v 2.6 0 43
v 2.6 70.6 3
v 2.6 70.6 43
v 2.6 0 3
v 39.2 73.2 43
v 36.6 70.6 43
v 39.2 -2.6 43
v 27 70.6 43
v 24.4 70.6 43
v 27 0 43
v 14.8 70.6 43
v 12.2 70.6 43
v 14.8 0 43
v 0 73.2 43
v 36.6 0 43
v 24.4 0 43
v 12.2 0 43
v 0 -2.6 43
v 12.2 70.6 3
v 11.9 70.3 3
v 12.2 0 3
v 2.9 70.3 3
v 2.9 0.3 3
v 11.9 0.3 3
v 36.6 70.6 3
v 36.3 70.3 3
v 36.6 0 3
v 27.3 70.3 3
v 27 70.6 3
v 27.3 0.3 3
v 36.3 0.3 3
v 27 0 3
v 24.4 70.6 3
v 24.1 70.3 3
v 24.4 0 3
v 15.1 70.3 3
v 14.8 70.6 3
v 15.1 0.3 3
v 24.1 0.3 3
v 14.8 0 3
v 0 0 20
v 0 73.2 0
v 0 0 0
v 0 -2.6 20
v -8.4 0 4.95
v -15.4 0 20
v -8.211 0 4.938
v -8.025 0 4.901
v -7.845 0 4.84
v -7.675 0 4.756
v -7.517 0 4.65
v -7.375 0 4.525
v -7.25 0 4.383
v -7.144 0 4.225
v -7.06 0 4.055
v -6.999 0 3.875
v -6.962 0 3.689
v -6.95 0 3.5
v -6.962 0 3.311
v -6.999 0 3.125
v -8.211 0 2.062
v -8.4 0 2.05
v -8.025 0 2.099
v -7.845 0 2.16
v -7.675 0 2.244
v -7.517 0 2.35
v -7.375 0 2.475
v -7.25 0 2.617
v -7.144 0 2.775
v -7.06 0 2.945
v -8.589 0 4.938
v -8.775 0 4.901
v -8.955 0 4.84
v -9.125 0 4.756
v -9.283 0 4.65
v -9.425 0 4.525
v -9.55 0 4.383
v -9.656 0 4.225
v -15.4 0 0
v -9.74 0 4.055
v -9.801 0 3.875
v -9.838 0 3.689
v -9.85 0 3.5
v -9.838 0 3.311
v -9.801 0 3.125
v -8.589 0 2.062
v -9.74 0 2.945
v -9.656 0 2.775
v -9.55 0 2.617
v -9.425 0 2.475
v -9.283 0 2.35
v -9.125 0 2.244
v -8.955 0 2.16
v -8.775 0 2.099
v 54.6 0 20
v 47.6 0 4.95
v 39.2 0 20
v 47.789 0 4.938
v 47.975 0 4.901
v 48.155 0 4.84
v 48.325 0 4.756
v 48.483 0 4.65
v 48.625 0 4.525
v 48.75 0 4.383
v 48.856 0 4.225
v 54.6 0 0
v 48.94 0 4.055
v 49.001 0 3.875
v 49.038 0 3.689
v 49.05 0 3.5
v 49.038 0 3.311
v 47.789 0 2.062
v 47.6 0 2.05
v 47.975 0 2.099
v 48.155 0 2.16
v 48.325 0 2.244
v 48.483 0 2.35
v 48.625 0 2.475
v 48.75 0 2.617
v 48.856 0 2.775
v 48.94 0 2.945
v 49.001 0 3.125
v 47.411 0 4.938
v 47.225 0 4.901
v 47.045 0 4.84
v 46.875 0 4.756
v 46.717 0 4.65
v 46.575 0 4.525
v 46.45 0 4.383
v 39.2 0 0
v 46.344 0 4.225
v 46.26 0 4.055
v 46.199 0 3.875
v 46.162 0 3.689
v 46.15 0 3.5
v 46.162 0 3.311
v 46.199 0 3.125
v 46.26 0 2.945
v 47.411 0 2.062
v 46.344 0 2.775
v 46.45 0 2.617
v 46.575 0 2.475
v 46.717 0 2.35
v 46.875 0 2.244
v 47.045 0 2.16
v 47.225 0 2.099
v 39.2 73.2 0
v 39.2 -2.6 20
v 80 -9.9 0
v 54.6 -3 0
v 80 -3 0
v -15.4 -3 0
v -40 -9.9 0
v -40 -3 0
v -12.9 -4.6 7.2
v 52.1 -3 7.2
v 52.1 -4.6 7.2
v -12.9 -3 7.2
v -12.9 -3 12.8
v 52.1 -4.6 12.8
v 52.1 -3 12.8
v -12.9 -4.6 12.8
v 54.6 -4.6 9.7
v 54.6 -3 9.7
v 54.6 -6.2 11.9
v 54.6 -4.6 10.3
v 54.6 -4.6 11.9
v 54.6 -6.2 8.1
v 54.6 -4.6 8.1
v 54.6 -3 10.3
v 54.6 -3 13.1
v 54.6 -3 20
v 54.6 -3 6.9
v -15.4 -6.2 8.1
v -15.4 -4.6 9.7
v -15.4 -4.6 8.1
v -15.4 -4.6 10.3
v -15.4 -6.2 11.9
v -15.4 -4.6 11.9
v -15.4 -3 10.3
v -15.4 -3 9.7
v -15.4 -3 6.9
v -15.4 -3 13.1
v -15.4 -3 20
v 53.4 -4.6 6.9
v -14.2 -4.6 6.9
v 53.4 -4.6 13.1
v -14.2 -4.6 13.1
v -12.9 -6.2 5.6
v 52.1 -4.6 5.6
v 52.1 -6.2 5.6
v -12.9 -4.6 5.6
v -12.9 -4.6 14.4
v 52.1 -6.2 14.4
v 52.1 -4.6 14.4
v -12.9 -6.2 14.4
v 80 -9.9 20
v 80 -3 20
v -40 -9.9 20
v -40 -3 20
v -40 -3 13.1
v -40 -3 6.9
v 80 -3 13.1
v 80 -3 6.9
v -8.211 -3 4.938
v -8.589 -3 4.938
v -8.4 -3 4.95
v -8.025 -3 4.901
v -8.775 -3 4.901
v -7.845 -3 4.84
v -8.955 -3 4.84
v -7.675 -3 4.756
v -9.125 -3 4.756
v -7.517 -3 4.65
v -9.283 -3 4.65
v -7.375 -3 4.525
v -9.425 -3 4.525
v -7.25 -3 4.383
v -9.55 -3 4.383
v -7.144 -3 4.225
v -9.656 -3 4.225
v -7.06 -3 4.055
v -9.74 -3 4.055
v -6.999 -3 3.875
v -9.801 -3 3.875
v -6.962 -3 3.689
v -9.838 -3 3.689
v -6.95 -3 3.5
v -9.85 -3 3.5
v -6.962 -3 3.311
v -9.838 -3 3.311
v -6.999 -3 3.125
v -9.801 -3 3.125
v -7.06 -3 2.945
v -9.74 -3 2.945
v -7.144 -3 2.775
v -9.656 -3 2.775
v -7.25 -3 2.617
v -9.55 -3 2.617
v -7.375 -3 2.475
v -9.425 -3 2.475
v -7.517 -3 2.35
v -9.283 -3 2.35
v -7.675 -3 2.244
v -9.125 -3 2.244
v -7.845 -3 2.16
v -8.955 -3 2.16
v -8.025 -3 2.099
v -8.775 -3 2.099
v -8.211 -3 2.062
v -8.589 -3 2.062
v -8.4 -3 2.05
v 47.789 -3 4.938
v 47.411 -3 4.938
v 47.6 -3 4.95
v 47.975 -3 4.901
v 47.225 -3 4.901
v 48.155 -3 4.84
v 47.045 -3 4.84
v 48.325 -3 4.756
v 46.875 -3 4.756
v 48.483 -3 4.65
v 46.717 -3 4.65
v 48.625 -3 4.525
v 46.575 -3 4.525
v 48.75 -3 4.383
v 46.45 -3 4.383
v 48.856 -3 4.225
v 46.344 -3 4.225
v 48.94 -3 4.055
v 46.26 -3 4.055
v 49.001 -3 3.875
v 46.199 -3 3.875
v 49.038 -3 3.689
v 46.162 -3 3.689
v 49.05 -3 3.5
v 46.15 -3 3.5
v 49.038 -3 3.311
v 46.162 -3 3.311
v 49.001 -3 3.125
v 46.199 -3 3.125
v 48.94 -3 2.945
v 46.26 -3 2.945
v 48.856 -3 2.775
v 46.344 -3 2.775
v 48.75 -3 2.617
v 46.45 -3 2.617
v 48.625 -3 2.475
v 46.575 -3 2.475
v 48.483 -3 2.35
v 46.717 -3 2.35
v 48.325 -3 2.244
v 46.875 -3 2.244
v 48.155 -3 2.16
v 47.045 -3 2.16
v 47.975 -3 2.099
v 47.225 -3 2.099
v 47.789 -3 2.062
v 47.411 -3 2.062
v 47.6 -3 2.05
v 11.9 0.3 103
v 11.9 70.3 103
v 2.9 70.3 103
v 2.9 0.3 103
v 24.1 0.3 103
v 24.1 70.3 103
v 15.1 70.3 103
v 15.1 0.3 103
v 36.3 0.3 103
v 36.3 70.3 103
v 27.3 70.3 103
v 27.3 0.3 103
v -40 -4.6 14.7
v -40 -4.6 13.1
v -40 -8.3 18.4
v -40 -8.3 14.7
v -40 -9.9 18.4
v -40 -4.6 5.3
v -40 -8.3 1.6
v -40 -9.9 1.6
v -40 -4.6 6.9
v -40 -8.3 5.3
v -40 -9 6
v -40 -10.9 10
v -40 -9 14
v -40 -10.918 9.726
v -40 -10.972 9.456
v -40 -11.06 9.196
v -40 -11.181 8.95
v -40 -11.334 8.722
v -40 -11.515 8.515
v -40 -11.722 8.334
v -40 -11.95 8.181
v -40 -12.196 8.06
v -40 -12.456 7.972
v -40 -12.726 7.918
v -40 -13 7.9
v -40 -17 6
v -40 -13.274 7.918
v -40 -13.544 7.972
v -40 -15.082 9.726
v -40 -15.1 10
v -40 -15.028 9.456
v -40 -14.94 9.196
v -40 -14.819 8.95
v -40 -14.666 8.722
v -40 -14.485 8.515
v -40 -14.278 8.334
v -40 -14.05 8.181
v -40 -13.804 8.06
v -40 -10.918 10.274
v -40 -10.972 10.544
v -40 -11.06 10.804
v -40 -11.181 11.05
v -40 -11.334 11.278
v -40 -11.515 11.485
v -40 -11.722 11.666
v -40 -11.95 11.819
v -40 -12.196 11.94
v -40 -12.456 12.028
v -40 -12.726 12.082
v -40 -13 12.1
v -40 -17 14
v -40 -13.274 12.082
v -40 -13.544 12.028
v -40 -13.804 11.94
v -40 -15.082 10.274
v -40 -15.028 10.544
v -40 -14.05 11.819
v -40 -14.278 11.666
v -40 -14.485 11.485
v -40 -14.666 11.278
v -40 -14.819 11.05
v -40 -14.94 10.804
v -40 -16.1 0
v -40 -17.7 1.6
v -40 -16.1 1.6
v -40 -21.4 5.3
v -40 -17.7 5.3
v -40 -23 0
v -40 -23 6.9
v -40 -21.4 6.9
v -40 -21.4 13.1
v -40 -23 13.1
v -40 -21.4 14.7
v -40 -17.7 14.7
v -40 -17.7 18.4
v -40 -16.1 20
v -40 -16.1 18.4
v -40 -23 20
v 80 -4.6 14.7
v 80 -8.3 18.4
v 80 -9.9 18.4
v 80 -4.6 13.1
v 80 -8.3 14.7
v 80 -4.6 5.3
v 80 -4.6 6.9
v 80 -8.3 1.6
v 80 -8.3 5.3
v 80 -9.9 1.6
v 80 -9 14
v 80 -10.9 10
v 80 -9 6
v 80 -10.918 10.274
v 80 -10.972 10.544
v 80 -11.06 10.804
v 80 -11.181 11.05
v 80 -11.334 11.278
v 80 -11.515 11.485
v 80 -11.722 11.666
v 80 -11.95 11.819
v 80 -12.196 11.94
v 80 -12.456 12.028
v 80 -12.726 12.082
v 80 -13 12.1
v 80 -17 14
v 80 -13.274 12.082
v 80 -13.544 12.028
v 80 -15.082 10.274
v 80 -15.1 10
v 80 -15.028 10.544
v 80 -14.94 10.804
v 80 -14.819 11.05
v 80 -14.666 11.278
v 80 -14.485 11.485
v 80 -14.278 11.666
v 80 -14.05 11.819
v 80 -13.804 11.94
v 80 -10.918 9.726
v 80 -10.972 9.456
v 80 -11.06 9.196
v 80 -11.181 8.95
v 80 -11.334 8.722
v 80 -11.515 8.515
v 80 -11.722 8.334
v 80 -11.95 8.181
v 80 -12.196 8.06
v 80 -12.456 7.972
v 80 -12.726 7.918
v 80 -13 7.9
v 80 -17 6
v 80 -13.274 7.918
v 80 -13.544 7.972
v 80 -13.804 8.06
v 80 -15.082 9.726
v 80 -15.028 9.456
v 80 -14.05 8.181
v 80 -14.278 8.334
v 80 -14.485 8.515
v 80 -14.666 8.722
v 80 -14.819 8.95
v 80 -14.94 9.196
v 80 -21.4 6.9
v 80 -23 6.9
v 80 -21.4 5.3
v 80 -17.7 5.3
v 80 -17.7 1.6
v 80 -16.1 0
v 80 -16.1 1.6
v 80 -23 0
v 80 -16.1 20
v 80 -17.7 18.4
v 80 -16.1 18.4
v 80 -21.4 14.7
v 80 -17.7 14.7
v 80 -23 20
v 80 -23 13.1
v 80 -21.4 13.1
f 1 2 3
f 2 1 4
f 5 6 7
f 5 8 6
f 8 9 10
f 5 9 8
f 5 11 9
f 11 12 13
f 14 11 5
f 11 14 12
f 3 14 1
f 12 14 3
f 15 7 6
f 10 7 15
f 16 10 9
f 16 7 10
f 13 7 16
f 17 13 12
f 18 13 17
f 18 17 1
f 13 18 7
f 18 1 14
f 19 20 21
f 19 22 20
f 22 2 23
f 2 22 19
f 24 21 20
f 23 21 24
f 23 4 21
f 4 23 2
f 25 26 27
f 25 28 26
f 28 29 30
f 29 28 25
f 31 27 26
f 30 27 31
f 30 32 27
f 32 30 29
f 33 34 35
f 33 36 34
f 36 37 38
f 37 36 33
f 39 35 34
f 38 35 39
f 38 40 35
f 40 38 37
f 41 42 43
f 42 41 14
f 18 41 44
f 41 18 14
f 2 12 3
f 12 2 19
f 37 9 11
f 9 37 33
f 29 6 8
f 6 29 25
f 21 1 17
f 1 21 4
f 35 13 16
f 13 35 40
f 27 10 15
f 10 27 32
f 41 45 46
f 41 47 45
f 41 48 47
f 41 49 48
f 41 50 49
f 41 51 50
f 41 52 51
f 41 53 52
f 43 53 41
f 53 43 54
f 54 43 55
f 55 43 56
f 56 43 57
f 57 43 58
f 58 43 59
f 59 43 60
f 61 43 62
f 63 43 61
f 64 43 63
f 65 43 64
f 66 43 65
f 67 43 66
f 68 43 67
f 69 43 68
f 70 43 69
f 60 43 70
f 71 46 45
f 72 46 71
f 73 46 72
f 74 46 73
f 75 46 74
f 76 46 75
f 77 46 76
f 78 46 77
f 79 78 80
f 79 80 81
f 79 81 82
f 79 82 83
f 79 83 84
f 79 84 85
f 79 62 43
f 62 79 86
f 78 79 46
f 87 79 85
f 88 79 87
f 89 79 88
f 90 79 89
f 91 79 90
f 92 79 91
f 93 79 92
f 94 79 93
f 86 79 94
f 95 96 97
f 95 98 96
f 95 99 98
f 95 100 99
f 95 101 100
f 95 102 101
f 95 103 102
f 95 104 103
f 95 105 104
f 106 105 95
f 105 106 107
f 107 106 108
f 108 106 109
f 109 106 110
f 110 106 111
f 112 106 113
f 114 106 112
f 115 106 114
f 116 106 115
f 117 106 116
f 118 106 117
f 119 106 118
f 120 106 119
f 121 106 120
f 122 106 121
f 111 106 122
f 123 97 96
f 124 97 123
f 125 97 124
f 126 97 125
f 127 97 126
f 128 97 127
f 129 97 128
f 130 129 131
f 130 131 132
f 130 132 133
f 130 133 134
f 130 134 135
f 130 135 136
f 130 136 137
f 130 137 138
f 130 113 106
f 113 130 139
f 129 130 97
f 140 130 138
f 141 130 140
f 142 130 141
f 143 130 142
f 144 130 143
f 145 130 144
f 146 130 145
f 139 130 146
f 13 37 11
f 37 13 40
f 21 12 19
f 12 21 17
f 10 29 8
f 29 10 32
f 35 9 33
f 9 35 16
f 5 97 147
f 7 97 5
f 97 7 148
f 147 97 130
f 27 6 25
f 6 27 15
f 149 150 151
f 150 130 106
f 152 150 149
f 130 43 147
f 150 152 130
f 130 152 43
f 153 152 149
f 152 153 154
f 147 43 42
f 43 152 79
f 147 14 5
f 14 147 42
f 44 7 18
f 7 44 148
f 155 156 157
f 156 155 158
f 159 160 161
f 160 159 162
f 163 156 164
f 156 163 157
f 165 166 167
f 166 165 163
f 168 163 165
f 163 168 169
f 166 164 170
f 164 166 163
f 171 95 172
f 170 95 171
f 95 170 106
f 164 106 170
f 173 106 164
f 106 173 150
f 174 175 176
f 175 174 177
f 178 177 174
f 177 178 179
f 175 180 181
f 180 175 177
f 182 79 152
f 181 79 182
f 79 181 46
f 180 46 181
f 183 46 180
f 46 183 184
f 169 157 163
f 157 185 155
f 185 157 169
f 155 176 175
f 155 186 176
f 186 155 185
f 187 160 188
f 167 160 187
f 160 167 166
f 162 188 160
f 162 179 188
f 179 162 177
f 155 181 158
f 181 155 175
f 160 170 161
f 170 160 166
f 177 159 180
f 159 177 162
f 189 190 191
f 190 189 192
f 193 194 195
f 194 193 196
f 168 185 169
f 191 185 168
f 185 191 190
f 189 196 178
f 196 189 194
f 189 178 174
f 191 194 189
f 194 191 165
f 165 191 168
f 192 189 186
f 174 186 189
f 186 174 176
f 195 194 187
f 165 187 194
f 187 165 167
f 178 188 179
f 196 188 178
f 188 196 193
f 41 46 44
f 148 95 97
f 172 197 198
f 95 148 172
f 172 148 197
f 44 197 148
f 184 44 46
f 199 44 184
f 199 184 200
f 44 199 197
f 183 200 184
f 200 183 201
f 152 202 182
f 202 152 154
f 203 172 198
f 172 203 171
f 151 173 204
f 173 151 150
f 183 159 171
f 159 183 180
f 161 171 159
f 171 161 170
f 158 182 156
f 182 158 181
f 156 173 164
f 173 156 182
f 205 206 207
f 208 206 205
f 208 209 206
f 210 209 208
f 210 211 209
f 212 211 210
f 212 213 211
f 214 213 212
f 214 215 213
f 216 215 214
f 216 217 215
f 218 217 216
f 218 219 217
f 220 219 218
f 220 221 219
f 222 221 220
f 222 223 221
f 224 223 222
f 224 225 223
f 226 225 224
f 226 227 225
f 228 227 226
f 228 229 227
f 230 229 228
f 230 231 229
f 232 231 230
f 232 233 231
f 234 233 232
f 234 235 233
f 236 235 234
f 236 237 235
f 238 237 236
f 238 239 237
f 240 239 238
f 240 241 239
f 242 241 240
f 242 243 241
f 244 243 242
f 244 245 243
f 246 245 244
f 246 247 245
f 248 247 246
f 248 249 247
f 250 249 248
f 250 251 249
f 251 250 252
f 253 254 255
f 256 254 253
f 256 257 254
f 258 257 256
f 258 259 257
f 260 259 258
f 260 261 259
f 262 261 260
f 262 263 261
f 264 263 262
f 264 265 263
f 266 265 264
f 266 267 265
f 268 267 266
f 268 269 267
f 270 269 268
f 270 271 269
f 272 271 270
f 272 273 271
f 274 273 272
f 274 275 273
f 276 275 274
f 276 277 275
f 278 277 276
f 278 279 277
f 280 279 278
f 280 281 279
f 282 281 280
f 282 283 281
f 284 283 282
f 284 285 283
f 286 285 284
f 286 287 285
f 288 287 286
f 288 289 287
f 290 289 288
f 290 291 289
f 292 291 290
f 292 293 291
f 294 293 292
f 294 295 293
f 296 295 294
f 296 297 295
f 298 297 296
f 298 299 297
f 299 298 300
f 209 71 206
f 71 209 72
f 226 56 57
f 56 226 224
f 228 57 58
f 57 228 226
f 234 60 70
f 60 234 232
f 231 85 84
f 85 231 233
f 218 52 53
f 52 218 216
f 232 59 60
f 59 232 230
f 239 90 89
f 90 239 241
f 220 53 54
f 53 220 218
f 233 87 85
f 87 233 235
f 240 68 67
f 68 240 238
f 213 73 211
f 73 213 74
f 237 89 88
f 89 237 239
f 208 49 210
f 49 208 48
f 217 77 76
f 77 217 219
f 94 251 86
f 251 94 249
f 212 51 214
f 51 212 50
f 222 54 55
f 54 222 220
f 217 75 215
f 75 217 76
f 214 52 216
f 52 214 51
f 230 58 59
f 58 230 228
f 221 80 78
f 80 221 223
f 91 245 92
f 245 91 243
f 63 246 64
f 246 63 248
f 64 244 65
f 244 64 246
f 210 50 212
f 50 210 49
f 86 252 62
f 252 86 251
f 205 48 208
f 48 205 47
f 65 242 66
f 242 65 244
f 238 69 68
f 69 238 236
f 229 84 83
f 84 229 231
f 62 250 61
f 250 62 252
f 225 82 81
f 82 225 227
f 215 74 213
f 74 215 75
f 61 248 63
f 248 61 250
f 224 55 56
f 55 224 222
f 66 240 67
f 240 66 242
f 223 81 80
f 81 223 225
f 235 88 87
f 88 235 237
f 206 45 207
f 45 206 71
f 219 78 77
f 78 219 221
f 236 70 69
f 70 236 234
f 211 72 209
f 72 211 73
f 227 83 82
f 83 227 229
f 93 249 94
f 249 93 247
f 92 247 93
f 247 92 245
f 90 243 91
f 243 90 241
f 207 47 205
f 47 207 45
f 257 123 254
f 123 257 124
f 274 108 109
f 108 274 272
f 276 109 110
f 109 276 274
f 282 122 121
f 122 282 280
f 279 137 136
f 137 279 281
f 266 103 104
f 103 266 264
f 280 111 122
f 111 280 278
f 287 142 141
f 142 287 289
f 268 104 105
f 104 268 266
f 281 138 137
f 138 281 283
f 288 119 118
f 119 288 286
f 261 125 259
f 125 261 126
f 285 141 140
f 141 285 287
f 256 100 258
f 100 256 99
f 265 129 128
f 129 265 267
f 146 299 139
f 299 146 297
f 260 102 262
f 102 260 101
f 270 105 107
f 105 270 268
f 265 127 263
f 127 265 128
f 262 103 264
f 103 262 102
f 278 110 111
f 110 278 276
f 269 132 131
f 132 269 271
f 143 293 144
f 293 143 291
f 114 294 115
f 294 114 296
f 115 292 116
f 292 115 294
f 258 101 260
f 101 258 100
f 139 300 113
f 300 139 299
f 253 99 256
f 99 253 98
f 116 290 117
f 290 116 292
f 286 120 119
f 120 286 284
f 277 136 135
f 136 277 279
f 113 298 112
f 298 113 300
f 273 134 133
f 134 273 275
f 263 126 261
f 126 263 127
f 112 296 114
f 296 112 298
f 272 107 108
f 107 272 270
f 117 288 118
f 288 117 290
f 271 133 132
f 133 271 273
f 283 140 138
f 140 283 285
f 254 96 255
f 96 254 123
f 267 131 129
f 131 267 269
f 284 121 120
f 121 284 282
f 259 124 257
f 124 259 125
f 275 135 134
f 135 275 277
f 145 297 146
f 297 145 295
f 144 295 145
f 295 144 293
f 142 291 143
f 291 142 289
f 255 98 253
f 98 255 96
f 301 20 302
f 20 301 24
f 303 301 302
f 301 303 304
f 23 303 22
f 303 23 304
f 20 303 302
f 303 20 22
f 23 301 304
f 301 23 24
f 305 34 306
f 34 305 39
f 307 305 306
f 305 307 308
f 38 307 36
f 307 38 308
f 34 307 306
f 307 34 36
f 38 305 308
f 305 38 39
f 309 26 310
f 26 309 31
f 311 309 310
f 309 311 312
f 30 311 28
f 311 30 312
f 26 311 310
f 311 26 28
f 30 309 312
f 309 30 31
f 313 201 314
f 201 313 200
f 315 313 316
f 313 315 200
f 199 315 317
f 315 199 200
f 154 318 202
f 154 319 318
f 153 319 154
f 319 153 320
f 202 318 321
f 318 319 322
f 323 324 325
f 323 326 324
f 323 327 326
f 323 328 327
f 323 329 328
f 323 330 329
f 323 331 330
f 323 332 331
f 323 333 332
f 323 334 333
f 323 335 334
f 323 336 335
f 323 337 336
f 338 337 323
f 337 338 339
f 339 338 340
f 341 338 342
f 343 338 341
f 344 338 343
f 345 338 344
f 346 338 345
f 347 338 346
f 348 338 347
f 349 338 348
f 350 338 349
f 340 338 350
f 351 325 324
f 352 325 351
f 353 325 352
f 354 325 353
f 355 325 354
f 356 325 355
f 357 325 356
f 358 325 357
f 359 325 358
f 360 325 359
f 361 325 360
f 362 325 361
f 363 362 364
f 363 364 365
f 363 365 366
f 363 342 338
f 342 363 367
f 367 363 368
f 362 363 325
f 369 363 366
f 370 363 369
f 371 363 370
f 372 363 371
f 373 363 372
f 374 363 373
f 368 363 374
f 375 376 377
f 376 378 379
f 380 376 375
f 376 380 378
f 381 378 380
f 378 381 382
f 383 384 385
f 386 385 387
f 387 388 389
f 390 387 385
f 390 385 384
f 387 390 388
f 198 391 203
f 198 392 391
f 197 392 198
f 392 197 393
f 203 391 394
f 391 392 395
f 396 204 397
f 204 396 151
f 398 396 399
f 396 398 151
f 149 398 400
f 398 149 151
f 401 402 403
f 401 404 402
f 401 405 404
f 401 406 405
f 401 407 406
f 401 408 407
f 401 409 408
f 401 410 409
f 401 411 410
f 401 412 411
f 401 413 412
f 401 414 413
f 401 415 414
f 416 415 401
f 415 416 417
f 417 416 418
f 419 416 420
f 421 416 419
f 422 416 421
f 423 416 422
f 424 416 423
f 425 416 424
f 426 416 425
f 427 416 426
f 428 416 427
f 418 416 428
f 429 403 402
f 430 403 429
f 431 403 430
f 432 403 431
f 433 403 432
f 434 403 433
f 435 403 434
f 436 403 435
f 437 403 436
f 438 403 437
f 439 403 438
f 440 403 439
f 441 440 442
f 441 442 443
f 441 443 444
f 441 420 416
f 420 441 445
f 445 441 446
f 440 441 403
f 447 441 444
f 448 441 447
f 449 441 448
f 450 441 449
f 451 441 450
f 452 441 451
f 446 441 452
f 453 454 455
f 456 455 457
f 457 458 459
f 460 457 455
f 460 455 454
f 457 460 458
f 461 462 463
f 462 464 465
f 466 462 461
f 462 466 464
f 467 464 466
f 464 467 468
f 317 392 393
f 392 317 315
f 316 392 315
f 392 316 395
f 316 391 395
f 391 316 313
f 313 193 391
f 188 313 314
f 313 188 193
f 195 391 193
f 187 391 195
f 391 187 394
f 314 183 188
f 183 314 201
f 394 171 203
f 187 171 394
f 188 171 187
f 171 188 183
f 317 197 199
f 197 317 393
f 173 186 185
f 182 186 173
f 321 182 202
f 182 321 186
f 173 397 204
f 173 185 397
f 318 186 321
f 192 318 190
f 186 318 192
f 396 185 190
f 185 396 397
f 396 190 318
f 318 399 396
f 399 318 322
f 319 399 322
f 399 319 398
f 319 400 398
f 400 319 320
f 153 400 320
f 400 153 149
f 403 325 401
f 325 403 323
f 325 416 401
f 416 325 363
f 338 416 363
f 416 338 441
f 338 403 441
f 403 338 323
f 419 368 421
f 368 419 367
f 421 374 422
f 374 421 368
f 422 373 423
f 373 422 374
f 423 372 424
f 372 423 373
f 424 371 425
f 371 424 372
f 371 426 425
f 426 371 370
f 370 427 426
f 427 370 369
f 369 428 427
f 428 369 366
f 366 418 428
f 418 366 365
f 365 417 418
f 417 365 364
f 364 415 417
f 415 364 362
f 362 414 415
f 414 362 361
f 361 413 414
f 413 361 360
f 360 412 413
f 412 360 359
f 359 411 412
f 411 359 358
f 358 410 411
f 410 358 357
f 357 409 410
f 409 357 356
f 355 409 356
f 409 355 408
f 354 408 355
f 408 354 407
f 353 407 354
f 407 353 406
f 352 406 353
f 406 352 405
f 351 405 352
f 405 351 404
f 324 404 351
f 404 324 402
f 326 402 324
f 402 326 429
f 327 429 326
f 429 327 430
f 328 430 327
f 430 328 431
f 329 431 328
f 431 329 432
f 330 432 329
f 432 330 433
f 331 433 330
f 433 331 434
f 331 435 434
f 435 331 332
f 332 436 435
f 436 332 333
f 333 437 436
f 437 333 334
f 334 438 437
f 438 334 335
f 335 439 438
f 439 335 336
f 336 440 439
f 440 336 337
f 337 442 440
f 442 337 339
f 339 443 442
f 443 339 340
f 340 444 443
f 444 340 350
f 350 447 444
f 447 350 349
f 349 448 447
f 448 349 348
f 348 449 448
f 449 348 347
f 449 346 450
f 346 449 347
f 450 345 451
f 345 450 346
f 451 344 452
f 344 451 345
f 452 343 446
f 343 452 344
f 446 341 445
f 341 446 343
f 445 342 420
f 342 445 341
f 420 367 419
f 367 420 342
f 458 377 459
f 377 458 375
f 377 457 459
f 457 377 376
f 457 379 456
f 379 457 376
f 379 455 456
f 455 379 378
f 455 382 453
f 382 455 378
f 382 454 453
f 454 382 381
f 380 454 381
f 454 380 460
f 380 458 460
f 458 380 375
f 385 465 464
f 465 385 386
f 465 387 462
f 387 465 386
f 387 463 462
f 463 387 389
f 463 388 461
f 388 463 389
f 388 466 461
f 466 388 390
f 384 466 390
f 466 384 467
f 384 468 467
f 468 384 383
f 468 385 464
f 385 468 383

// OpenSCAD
// file: ssd_holder.scad
// ============================================================
// 3-Bay Vertical 2.5" SSD Holder w/ T-Slot Rail Mount
// ============================================================
// Holds three 2.5" drives (70 x 100 x 9 mm) upright, SIDE BY SIDE
// ALONG THE RAIL — all three sit the same distance out from the
// rail rather than receding front-to-back, so no drive hangs off
// the end of a long lever arm. Each bay is a fully enclosed tub
// (floor + left/right dividers + front/back walls) with ONLY the
// top open, so the connector end of each drive stays reachable
// for cables while the drive itself is boxed in on every side.
//
// Mounting: ONE flat plate carrying ONE T-shaped key, running the
// full plate_len (default 70mm) along the rail. The key slides
// into the rail's channel from the end of the extrusion and is
// trapped by that channel's back wall and both side lips; the
// plate bears flat against the rail face. Tapered lead-ins at
// both ends of the key let it start from either direction and
// back straight off the way it went on.
//
// Note on "the longer side": with the drives side by side the
// comb's mounting face is its 39.2mm one — the 70mm faces are the
// ends of the stack, and mounting there is what puts the drives
// back in a front-to-back line. So the plate is instead EXTENDED
// to 70mm along the rail, overhanging the comb ~15mm at each end.
// That's the longest rail engagement available without going back
// to front-to-back drives. Set plate_len = comb_width for a flush
// plate if the overhang is in the way.
//
// Optional M3 set screws (set_screw = true) run through the
// plate's two overhanging ends, where nothing is behind them so a
// driver reaches with the drives still in. Driving them against
// the rail face pushes the bracket out and pulls the key's head
// up against the slot lips, taking the play out of the slide fit.
// Without them the bracket still holds but can rock slightly on
// its clearances.
//
// The rail is assumed HORIZONTAL, drives standing vertically
// (open top up) perpendicular to it. The rail's bottom sits flush
// with the bottom of the holder.
//
// Default key dims (6.2mm mouth / 9.4mm channel) match common
// 20-series T-slot/V-slot extrusion; measure your actual rail and
// adjust slot_mouth/channel_w/lip_thickness/head_depth below if
// it differs — a wrong fit either won't slide in or will be loose.
//
// Print settings: 3-4 walls, 20%+ infill, NO SUPPORTS — the comb
// floor and the mounting plate both sit flat on the bed, and the
// key's 3.2mm horizontal protrusion is short enough to print
// clean. PETG or ABS recommended since drives run warm; PLA is
// fine for a desk build.
// ============================================================

$fn = 48;

// ---- Drive dimensions ----
drive_w = 70;             // drive width (mm) - horizontal, pointing away from the rail
drive_h = 100;             // drive height (mm) - reference only, top is open
drive_t = 9;               // drive thickness (mm) - stacking direction, along the rail
drive_t_clearance = 0.6;   // total slack added to slot thickness for easy insertion
drive_y_clearance = 0.6;   // total slack added along the drive's width

// ---- Holder geometry ----
n_bays      = 3;
wall_t      = 2.6;   // divider / front-wall / back-wall thickness
wall_height = 40;    // how far up the walls enclose the drive (rest is open, at top)
floor_t     = 3;     // base plate thickness
slot_gap    = drive_t + drive_t_clearance;
bay_depth   = drive_w + drive_y_clearance; // how far each bay reaches away from the rail

// ---- Rail mount: one flat plate, one key ----
rail_size     = 20;    // T-slot extrusion cross-section (square)
plate_t       = 3;     // mounting plate thickness
plate_len     = 70;    // how far the plate runs ALONG the rail (engagement length)
plate_h       = 20;    // plate height - matches the rail face it bears against
slot_mouth    = 6.2;   // width of the narrow opening on the rail face
channel_w     = 9.4;   // internal width of the T-slot channel
lip_thickness = 1.6;   // depth of the narrow mouth before it opens into the channel
head_depth    = 1.6;   // how far the wide part of the key sits inside the channel
key_clearance = 0.3;   // per-side clearance so the key slides freely
key_lead_in   = 2.5;   // taper at each end of the key, so it starts into the slot
set_screw     = true;  // M3 set-screw holes through the plate to take up slide play
set_screw_d   = 2.9;   // pilot diameter for an M3 screw self-tapping into plastic
set_screw_inset = 7;   // how far each screw sits in from the plate's ends
set_screw_z   = 3.5;   // screw height on the plate - below the key, on solid rail face

key_neck_w = slot_mouth - 2 * key_clearance;
key_head_w = channel_w - 2 * key_clearance;

// ---- Derived ----
comb_width   = (n_bays + 1) * wall_t + n_bays * slot_gap; // span along the rail
total_height = floor_t + wall_height;
plate_x0     = (comb_width - plate_len) / 2;  // plate centered on the comb
key_z        = rail_size / 2;                 // key on the rail's slot centerline

module divider(x) {
    translate([x, 0, floor_t])
        cube([wall_t, bay_depth, wall_height]);
}

module base_body() {
    union() {
        // floor spans the full footprint, including under the front/back walls
        translate([0, -wall_t, 0])
            cube([comb_width, bay_depth + 2 * wall_t, floor_t]);
        // dividers - close the sides of every bay, stacked along the rail
        for (i = [0 : n_bays])
            divider(i * (wall_t + slot_gap));
        // front/back walls - close the near/far side of every bay
        translate([0, -wall_t, floor_t])
            cube([comb_width, wall_t, wall_height]);
        translate([0, bay_depth, floor_t])
            cube([comb_width, wall_t, wall_height]);
    }
}

module mount_plate() {
    translate([plate_x0, -plate_t, 0])
        cube([plate_len, plate_t, plate_h]);
}

// One segment of the key: a bar running along the rail (X), w tall
// in Z, protruding depth into -Y from y0, tapered at both ends so
// it can start into the slot from either direction.
module key_bar(w, y0, depth) {
    inner_w = max(w - 2 * key_lead_in, 0.1);
    hull() {
        translate([plate_x0 + key_lead_in, y0 - depth, key_z - w / 2])
            cube([plate_len - 2 * key_lead_in, depth, w]);
        translate([plate_x0, y0 - depth, key_z - inner_w / 2])
            cube([plate_len, depth, inner_w]);
    }
}

module t_slot_key() {
    key_bar(key_neck_w, -plate_t, lip_thickness);                 // through the slot mouth
    key_bar(key_head_w, -plate_t - lip_thickness, head_depth);    // inside the channel
}

// Two set screws, placed in the plate's overhanging ends where
// nothing is behind them, so a driver reaches from the back with
// the drives still in. Kept low on the plate, clear of the key:
// pushing the bracket's bottom edge off the rail face both takes
// up the slide play and leans against the way the loaded holder
// wants to tip.
module set_screw_holes() {
    for (x = [plate_x0 + set_screw_inset,
              plate_x0 + plate_len - set_screw_inset])
        translate([x, 1, set_screw_z])
            rotate([90, 0, 0])
                cylinder(d = set_screw_d, h = plate_t + 2);
}

module ssd_holder() {
    difference() {
        union() {
            base_body();
            mount_plate();
            t_slot_key();
        }
        if (set_screw) set_screw_holes();
    }
}

// Set false (by assigning after `include <ssd_holder.scad>`) to use
// this file as a library without rendering the holder itself.
render_holder = true;
if (render_holder) ssd_holder();
// main file
// ============================================================
// Fit check for ssd_holder.scad
// ============================================================
// Drops the holder into a modeled 20x20 T-slot rail and three
// modeled 2.5" drives, so the fit can be checked before printing.
//
//   show = "assembly"    holder + rail + drives, rendered together
//   show = "rail_clash"  ONLY where the holder intersects the rail
//   show = "drive_clash" ONLY where the holder intersects a drive
//
// Both clash modes must come out EMPTY. Render one and read the
// reported volume: "Top level object is a 3D object" with a real
// volume means parts are trying to occupy the same space.
//
//   openscad -o clash.stl -D 'show="rail_clash"' fit_check.scad
//
// The rail profile here is a nominal 20-series extrusion (6.2mm
// slot mouth, 9.4mm channel, 6mm deep, 4.2mm center bore). It is
// a stand-in for checking geometry — it is not a substitute for
// measuring your own rail.
// ============================================================

include <ssd_holder.scad>
render_holder = false; // we place the holder ourselves below

show = "assembly";

rail_len   = 120;  // length of rail to model
rail_x0    = -40;  // where that length starts
rail_bore  = 4.2;  // center bore diameter
slot_depth = 6.0;  // how deep the channel runs from the rail face

// The rail bears flat against the mounting plate's outer face.
rail_y_face   = -plate_t;
rail_y_center = rail_y_face - rail_size / 2;
rail_z_center = rail_size / 2;

module rail_slot_2d() {
    translate([-slot_mouth / 2, rail_size / 2 - lip_thickness])
        square([slot_mouth, lip_thickness]);
    translate([-channel_w / 2, rail_size / 2 - slot_depth])
        square([channel_w, slot_depth - lip_thickness]);
}

module rail_profile_2d() {
    difference() {
        square([rail_size, rail_size], center = true);
        for (a = [0 : 90 : 270]) rotate(a) rail_slot_2d();
        circle(d = rail_bore);
    }
}

module rail() {
    translate([rail_x0, rail_y_center, rail_z_center])
        rotate([0, 90, 0])
            linear_extrude(rail_len)
                rail_profile_2d();
}

// A drive sitting in bay i, centered in its slot, resting on the floor.
module drive(i) {
    x = wall_t + i * (wall_t + slot_gap) + (slot_gap - drive_t) / 2;
    translate([x, (bay_depth - drive_w) / 2, floor_t])
        cube([drive_t, drive_w, drive_h]);
}

module drives() {
    for (i = [0 : n_bays - 1]) drive(i);
}

if (show == "assembly") {
    color("SteelBlue")           ssd_holder();
    color("DimGray",   0.55)     rail();
    color("DarkOrange", 0.45)    drives();
} else if (show == "rail_clash") {
    intersection() { ssd_holder(); rail(); }
} else if (show == "drive_clash") {
    intersection() { ssd_holder(); drives(); }
}
